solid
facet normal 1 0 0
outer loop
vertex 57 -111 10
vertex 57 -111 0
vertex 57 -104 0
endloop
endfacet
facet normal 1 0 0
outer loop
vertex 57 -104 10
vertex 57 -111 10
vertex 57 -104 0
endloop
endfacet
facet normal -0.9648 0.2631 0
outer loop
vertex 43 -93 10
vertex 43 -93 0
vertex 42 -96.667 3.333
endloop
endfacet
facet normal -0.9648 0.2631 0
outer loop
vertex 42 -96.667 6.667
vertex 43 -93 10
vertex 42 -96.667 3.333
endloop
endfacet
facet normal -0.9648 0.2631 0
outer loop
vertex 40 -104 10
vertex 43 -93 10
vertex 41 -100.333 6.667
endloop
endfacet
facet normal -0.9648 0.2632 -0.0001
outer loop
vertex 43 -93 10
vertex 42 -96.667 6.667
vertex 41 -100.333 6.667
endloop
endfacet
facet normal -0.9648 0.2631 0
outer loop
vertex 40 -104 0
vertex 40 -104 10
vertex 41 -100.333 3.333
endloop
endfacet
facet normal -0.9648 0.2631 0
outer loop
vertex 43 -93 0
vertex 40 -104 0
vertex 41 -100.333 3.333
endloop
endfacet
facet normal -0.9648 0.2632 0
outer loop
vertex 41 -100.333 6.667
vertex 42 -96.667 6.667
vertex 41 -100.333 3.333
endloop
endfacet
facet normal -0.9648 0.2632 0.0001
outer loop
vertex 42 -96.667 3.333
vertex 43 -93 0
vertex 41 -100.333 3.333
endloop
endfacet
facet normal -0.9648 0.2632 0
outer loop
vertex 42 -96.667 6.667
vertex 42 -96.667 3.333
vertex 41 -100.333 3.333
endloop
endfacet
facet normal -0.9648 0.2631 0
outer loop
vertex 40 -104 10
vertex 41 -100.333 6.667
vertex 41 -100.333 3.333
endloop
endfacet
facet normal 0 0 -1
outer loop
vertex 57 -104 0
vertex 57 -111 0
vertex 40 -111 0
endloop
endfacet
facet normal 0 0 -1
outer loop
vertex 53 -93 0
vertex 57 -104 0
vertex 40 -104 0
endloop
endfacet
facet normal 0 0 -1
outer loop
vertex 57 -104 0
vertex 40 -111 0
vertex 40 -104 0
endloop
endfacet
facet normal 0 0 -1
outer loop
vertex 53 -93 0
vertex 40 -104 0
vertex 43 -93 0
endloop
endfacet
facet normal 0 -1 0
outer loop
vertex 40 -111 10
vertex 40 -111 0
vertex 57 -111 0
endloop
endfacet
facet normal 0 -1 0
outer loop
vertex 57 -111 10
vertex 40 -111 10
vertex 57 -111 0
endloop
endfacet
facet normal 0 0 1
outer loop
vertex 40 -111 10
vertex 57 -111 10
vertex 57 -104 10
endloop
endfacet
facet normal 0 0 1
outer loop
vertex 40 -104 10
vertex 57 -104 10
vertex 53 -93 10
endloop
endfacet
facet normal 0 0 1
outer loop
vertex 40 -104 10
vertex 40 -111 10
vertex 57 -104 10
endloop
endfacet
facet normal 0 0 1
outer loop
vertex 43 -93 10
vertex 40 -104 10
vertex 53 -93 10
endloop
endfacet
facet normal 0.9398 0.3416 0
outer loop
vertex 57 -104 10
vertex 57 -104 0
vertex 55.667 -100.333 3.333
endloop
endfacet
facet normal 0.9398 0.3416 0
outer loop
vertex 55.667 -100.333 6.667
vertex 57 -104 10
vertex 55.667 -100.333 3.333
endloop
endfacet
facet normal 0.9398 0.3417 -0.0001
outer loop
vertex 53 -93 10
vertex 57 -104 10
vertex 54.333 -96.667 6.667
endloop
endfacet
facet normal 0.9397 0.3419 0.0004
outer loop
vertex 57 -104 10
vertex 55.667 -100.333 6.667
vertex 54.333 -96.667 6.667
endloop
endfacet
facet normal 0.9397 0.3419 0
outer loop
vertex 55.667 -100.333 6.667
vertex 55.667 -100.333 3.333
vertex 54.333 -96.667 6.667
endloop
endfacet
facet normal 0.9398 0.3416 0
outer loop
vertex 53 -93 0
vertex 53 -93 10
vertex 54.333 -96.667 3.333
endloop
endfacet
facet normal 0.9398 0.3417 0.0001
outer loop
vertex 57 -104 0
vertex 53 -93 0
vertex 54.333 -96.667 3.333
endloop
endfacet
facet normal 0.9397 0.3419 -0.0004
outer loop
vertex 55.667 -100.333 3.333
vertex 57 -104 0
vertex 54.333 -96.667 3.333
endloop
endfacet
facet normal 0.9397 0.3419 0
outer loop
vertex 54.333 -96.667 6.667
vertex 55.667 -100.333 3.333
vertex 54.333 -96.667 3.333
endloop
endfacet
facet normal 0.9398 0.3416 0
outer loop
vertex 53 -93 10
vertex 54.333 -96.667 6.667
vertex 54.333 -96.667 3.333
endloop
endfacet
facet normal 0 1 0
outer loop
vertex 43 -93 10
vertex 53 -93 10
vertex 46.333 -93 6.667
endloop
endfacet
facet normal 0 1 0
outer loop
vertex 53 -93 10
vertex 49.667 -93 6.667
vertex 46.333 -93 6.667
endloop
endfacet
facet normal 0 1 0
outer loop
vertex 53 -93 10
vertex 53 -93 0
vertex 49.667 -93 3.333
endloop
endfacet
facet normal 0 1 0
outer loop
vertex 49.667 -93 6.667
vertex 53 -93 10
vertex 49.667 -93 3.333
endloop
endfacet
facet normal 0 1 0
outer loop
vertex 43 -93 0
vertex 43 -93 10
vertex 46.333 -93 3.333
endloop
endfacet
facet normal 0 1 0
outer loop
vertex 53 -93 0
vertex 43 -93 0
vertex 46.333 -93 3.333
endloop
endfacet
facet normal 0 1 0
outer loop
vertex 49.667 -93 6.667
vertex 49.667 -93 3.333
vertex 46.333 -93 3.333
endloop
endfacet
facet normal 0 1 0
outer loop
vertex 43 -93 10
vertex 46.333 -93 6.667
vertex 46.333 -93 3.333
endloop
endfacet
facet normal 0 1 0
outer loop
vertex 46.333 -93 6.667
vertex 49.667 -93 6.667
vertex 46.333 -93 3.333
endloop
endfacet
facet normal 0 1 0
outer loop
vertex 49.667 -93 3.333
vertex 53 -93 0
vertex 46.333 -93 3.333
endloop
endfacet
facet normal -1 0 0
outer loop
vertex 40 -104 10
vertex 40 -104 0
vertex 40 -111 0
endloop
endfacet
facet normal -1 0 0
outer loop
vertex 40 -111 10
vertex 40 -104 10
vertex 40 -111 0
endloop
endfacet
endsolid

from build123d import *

# Parameters (mm, degrees)
EXTRUDE_DEPTH = 10


with BuildPart() as part:
    # path6074 → Extrude (new body)
    with BuildSketch(Plane(origin=(48.500139, -101.999973, 0), x_dir=(0, 1, 0), z_dir=(0, 0, 1))):
        with BuildLine():
            add(Edge.make_bspline(
                [(8.999967, 5.500181), (5.3333, 6.500181), (1.666792, 7.499997), (-1.999878, 8.499997)],
                knots=[0, 0, 0, 0, 1, 1, 1, 1], degree=3))
            add(Edge.make_bspline(
                [(-1.999878, 8.499997), (-8.999967, 8.499997)],
                knots=[0, 0, 26.45703, 26.45703], degree=1))
            add(Edge.make_bspline(
                [(-8.999967, 8.499997), (-8.999967, -8.499997)],
                knots=[0, 0, 64.25195, 64.25195], degree=1))
            add(Edge.make_bspline(
                [(-8.999967, -8.499997), (-1.999878, -8.499997)],
                knots=[0, 0, 26.45703, 26.45703], degree=1))
            add(Edge.make_bspline(
                [(-1.999878, -8.499997), (1.666792, -7.166664), (5.3333, -5.833058), (8.999967, -4.499725)],
                knots=[0, 0, 0, 0, 1, 1, 1, 1], degree=3))
            add(Edge.make_bspline(
                [(8.999967, -4.499725), (8.999965, -1.166393), (8.999967, 2.166846), (8.999967, 5.500181)],
                knots=[0, 0, 0, 0, 1, 1, 1, 1], degree=3))
        make_face()
    extrude(amount=EXTRUDE_DEPTH)


solid = part.part
